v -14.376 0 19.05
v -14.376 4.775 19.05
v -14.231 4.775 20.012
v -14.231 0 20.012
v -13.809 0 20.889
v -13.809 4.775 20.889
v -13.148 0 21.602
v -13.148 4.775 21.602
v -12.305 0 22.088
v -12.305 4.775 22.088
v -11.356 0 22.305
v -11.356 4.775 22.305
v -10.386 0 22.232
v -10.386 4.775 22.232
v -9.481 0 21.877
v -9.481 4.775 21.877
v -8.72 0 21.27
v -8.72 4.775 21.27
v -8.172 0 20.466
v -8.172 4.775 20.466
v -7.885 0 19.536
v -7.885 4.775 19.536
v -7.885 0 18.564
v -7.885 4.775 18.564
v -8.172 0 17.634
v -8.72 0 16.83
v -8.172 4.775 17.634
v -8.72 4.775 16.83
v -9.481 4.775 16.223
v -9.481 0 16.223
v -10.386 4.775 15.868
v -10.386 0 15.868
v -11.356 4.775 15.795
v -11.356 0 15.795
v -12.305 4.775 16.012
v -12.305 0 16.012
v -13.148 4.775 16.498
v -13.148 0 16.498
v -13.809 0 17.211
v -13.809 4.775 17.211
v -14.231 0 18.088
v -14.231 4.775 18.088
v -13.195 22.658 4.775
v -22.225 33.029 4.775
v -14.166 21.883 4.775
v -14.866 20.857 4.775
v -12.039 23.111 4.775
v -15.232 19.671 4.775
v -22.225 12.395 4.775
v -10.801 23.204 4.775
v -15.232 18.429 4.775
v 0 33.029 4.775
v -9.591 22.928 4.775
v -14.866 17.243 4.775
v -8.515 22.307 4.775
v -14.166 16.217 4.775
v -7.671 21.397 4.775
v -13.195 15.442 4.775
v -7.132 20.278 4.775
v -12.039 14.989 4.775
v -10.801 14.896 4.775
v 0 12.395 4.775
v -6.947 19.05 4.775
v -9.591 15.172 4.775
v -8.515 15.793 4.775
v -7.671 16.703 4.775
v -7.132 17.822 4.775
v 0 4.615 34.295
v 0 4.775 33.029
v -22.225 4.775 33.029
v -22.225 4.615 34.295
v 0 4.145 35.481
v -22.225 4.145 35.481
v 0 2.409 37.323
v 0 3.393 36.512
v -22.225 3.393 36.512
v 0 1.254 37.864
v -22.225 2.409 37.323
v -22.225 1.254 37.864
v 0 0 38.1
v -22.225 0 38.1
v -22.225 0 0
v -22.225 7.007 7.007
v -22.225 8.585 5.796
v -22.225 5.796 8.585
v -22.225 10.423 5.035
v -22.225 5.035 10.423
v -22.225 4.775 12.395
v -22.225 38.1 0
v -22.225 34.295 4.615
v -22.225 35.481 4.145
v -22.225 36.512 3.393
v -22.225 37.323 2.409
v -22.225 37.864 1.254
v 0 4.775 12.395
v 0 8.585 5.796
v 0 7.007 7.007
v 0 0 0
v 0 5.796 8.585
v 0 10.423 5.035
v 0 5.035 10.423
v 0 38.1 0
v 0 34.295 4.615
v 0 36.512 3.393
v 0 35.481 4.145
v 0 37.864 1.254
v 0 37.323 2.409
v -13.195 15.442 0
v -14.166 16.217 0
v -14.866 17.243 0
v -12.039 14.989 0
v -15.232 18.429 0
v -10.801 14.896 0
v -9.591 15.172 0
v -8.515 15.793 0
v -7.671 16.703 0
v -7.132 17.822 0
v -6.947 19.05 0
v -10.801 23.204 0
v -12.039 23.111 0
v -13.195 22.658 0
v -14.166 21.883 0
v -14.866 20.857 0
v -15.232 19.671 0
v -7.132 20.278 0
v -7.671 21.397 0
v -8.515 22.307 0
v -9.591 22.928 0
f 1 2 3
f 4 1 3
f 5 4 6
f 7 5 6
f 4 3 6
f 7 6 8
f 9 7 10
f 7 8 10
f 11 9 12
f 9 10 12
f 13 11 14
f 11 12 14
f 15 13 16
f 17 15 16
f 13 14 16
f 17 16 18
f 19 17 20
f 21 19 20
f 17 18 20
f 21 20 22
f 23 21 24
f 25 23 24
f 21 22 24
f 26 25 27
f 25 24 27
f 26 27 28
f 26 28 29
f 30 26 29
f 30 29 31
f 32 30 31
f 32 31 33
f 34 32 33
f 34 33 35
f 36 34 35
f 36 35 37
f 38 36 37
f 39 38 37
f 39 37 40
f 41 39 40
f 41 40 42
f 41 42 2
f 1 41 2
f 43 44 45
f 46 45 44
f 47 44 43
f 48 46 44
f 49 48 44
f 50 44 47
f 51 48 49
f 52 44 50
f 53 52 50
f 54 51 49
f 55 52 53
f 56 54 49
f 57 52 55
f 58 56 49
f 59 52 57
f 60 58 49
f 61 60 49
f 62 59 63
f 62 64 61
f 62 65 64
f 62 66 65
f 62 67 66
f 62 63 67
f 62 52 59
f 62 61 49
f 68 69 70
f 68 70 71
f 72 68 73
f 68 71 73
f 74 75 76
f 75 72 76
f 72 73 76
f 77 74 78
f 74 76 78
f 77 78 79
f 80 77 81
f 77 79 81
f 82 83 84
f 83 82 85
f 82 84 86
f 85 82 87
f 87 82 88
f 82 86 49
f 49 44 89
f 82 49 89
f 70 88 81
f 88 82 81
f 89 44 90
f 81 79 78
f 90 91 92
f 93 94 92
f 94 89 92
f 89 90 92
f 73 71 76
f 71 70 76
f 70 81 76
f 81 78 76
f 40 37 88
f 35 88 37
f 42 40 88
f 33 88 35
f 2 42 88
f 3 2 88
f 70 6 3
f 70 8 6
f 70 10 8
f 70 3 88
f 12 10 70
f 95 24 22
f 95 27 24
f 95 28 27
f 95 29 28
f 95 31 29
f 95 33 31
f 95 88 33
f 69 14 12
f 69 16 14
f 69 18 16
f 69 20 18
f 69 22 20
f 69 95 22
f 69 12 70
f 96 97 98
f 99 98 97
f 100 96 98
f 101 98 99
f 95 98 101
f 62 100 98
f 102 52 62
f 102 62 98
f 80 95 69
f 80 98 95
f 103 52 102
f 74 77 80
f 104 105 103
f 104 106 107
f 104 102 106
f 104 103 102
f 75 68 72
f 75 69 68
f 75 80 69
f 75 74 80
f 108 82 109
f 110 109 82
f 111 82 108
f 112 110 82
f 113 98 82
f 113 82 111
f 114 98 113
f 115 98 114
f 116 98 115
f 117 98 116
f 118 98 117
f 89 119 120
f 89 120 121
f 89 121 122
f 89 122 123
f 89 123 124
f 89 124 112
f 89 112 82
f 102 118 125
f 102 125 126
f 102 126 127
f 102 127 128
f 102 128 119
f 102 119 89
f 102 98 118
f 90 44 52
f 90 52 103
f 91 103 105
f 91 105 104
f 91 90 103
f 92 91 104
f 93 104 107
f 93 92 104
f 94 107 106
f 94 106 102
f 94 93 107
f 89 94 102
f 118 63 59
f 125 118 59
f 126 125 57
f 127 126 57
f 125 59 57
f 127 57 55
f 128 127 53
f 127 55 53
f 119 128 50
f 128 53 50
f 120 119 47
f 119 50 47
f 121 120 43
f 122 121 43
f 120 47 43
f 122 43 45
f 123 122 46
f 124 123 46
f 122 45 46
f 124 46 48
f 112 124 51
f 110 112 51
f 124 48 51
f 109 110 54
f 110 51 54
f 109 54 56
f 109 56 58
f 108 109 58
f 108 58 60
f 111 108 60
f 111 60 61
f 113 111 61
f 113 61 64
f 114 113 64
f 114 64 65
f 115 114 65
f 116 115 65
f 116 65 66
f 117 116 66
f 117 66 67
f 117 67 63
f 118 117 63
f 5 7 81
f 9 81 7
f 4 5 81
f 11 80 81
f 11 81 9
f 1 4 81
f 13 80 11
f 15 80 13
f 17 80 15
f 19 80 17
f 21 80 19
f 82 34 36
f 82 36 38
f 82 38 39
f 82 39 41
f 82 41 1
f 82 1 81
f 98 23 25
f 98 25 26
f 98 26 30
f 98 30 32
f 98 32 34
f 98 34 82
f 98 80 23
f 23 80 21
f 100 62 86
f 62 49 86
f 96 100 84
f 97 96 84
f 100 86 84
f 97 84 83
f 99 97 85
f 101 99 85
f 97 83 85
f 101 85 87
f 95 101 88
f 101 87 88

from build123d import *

# Parameters (mm, degrees)
F1_DEPTH    = 22.225
F2_R        = 7.62
F3_T1_DEPTH = 47.5792387778
F4_R        = 3.2639
F5_DEPTH    = 4.7762
F6_R        = 4.1656
F7_DEPTH    = 4.7762


# Not quite as in the source:
# - a fillet or chamfer that OpenCascade refuses, or shapes differently, is made with other operations: its cross-section is extruded or revolved along the edge and cut away or added


with BuildPart() as f1:
    # F0 (on Right) → F1 (new body)
    with BuildSketch(Plane.YZ):
        Polygon((0, 38.1), (0, 0), (38.1, 0), (38.1, 4.7752), (4.7752, 4.7752), (4.7752, 38.1), align=None)
    extrude(amount=-F1_DEPTH)

    # F2
    f2_edges = [f1.edges().sort_by_distance(p)[0] for p in [
        (-11.1125, 4.7752, 4.7752),
    ]]
    fillet(f2_edges, radius=F2_R)

    # F3: fillet of radius 5.08 on 2 edges, made by hand

    # F3_s2 → F3_t1 (cut)
    with BuildSketch(Plane.YZ.offset(-34.9021193889)):
        with BuildLine():
            ThreePointArc((4.7752, 33.0291522444), (3.3934958238, 36.5118247815), (0, 38.1))
            Line((0, 38.1), (4.7752, 38.1))
            Line((4.7752, 38.1), (4.7752, 33.0291522444))
        make_face()
        with BuildLine():
            ThreePointArc((33.0291522444, 4.7752), (36.5118247815, 3.3934958238), (38.1, 0))
            Line((38.1, 0), (38.1, 4.7752))
            Line((38.1, 4.7752), (33.0291522444, 4.7752))
        make_face()
    extrude(amount=F3_T1_DEPTH, mode=Mode.SUBTRACT)

    # F4 (on face) → F5 (cut, through all)
    with BuildSketch(Plane(origin=(0, 4.7752, 0), x_dir=(-1, 0, 0), z_dir=(0, 1, 0))):
        with Locations((11.1125, 19.05)):
            Circle(F4_R)
    extrude(amount=-F5_DEPTH, mode=Mode.SUBTRACT)

    # F6 (on face) → F7 (cut, through all)
    with BuildSketch(Plane.XY.offset(4.7752)):
        with Locations((-11.1125, 19.05)):
            Circle(F6_R)
    extrude(amount=-F7_DEPTH, mode=Mode.SUBTRACT)


solid = f1.part
